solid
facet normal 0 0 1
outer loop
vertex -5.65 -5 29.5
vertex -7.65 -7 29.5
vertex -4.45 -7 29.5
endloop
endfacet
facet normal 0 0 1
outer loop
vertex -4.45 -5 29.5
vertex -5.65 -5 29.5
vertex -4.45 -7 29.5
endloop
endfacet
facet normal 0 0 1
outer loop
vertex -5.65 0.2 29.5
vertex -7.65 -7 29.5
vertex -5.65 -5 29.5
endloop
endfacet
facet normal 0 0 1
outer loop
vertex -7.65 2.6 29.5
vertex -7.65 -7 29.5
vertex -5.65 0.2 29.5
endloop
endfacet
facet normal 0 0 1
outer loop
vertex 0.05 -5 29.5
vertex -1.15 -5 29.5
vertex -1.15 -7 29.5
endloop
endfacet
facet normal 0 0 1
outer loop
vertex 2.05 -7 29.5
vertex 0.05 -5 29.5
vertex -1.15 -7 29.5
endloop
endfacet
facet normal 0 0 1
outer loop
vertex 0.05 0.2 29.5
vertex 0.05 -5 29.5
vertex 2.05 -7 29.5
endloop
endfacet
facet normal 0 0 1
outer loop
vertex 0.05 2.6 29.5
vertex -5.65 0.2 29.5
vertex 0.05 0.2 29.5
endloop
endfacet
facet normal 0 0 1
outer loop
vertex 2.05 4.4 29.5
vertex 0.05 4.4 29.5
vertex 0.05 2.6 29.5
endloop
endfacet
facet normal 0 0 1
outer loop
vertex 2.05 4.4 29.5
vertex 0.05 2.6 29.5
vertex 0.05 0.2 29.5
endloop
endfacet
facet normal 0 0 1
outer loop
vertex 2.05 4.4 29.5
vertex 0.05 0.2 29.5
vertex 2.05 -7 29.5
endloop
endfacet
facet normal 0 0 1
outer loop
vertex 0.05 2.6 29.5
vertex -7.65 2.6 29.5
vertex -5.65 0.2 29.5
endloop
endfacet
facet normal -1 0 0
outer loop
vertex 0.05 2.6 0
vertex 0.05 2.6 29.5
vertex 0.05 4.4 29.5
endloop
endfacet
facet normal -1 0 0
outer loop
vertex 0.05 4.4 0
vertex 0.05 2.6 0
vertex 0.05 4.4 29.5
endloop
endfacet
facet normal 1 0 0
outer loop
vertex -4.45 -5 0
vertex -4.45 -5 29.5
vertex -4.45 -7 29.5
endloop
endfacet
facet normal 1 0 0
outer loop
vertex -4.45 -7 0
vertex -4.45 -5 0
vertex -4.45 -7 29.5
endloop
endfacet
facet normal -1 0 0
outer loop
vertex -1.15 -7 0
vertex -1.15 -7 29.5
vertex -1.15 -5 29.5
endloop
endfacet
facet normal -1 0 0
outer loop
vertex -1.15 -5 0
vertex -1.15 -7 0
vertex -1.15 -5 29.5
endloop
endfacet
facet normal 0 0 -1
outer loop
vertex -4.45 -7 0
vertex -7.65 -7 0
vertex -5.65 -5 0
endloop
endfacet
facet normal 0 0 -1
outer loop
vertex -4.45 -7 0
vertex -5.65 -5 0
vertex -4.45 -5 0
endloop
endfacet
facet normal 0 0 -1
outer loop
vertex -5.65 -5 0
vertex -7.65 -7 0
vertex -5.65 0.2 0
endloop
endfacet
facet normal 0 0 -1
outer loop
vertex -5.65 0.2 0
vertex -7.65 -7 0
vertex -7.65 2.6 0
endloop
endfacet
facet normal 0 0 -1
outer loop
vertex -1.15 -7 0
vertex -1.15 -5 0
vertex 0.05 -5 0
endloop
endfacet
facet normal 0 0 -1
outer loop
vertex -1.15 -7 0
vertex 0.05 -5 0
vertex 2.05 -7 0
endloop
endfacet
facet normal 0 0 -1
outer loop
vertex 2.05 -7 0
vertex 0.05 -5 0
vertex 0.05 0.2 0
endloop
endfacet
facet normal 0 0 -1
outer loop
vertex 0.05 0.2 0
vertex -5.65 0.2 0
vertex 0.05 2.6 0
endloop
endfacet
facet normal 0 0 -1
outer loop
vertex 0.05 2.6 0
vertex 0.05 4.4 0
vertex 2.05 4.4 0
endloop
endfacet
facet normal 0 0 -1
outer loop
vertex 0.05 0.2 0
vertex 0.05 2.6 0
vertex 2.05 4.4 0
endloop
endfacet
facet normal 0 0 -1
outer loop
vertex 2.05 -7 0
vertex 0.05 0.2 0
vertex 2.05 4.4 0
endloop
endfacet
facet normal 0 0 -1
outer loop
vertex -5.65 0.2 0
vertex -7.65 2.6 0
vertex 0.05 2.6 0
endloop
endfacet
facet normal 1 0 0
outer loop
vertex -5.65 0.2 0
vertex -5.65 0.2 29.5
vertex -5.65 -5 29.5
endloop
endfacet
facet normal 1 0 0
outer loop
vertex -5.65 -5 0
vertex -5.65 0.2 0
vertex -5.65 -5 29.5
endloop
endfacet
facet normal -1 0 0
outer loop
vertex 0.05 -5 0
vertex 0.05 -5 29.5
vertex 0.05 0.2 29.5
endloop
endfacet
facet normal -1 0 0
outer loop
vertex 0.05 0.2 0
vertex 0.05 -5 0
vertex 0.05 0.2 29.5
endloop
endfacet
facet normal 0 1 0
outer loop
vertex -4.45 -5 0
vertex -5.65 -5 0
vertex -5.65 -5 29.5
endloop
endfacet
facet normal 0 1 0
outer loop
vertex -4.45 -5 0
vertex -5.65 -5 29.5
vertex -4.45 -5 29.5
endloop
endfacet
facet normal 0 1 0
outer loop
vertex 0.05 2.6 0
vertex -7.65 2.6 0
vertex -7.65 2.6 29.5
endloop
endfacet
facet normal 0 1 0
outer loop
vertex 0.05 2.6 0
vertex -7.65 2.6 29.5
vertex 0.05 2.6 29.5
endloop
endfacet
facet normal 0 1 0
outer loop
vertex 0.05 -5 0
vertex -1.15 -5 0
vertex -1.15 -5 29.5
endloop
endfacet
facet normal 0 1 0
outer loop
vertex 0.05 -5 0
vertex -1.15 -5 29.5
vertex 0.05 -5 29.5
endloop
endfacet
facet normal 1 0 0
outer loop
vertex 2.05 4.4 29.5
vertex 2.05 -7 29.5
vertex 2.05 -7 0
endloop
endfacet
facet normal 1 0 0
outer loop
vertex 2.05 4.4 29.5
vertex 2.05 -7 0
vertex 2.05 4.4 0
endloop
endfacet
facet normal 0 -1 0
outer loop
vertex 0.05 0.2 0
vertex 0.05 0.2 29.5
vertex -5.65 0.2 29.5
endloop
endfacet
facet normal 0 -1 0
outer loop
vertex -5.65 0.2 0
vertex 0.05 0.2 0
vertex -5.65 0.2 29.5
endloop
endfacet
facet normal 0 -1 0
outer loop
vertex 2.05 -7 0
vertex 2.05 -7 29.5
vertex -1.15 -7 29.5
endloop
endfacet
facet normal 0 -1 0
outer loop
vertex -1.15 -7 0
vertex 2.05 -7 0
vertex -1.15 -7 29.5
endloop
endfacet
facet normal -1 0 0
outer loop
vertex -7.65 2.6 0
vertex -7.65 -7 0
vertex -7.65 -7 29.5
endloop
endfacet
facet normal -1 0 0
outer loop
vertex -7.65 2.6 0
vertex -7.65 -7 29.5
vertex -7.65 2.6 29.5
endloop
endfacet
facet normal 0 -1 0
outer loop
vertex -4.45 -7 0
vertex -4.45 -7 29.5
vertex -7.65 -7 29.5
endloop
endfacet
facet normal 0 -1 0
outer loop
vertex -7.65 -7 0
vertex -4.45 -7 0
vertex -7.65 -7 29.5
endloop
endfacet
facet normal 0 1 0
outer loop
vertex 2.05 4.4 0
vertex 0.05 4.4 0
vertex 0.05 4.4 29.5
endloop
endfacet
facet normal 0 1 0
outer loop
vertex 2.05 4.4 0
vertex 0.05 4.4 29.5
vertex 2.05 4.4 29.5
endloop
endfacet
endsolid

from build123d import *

# Parameters (mm, degrees)
BOSS_EXTRUDE1_DEPTH = 29.5
SKETCH2_W           = 2
SKETCH2_H           = 1.8
BOSS_EXTRUDE2_DEPTH = 29.5


with BuildPart() as part:
    # Sketch1 → Boss-Extrude1 (new body)
    with BuildSketch(Plane.XY):
        Polygon((-7.65, 2.6), (2.05, 2.6), (2.05, -7), (-1.15, -7), (-1.15, -5), (0.05, -5), (0.05, 0.2), (-5.65, 0.2), (-5.65, -5), (-4.45, -5), (-4.45, -7), (-7.65, -7), align=None)
    extrude(amount=BOSS_EXTRUDE1_DEPTH)

    # Sketch2 → Boss-Extrude2 (add)
    with BuildSketch(Plane.XY.offset(29.5)):
        with Locations((1.05, 3.5)):
            Rectangle(SKETCH2_W, SKETCH2_H)
    extrude(amount=-BOSS_EXTRUDE2_DEPTH)


solid = part.part
